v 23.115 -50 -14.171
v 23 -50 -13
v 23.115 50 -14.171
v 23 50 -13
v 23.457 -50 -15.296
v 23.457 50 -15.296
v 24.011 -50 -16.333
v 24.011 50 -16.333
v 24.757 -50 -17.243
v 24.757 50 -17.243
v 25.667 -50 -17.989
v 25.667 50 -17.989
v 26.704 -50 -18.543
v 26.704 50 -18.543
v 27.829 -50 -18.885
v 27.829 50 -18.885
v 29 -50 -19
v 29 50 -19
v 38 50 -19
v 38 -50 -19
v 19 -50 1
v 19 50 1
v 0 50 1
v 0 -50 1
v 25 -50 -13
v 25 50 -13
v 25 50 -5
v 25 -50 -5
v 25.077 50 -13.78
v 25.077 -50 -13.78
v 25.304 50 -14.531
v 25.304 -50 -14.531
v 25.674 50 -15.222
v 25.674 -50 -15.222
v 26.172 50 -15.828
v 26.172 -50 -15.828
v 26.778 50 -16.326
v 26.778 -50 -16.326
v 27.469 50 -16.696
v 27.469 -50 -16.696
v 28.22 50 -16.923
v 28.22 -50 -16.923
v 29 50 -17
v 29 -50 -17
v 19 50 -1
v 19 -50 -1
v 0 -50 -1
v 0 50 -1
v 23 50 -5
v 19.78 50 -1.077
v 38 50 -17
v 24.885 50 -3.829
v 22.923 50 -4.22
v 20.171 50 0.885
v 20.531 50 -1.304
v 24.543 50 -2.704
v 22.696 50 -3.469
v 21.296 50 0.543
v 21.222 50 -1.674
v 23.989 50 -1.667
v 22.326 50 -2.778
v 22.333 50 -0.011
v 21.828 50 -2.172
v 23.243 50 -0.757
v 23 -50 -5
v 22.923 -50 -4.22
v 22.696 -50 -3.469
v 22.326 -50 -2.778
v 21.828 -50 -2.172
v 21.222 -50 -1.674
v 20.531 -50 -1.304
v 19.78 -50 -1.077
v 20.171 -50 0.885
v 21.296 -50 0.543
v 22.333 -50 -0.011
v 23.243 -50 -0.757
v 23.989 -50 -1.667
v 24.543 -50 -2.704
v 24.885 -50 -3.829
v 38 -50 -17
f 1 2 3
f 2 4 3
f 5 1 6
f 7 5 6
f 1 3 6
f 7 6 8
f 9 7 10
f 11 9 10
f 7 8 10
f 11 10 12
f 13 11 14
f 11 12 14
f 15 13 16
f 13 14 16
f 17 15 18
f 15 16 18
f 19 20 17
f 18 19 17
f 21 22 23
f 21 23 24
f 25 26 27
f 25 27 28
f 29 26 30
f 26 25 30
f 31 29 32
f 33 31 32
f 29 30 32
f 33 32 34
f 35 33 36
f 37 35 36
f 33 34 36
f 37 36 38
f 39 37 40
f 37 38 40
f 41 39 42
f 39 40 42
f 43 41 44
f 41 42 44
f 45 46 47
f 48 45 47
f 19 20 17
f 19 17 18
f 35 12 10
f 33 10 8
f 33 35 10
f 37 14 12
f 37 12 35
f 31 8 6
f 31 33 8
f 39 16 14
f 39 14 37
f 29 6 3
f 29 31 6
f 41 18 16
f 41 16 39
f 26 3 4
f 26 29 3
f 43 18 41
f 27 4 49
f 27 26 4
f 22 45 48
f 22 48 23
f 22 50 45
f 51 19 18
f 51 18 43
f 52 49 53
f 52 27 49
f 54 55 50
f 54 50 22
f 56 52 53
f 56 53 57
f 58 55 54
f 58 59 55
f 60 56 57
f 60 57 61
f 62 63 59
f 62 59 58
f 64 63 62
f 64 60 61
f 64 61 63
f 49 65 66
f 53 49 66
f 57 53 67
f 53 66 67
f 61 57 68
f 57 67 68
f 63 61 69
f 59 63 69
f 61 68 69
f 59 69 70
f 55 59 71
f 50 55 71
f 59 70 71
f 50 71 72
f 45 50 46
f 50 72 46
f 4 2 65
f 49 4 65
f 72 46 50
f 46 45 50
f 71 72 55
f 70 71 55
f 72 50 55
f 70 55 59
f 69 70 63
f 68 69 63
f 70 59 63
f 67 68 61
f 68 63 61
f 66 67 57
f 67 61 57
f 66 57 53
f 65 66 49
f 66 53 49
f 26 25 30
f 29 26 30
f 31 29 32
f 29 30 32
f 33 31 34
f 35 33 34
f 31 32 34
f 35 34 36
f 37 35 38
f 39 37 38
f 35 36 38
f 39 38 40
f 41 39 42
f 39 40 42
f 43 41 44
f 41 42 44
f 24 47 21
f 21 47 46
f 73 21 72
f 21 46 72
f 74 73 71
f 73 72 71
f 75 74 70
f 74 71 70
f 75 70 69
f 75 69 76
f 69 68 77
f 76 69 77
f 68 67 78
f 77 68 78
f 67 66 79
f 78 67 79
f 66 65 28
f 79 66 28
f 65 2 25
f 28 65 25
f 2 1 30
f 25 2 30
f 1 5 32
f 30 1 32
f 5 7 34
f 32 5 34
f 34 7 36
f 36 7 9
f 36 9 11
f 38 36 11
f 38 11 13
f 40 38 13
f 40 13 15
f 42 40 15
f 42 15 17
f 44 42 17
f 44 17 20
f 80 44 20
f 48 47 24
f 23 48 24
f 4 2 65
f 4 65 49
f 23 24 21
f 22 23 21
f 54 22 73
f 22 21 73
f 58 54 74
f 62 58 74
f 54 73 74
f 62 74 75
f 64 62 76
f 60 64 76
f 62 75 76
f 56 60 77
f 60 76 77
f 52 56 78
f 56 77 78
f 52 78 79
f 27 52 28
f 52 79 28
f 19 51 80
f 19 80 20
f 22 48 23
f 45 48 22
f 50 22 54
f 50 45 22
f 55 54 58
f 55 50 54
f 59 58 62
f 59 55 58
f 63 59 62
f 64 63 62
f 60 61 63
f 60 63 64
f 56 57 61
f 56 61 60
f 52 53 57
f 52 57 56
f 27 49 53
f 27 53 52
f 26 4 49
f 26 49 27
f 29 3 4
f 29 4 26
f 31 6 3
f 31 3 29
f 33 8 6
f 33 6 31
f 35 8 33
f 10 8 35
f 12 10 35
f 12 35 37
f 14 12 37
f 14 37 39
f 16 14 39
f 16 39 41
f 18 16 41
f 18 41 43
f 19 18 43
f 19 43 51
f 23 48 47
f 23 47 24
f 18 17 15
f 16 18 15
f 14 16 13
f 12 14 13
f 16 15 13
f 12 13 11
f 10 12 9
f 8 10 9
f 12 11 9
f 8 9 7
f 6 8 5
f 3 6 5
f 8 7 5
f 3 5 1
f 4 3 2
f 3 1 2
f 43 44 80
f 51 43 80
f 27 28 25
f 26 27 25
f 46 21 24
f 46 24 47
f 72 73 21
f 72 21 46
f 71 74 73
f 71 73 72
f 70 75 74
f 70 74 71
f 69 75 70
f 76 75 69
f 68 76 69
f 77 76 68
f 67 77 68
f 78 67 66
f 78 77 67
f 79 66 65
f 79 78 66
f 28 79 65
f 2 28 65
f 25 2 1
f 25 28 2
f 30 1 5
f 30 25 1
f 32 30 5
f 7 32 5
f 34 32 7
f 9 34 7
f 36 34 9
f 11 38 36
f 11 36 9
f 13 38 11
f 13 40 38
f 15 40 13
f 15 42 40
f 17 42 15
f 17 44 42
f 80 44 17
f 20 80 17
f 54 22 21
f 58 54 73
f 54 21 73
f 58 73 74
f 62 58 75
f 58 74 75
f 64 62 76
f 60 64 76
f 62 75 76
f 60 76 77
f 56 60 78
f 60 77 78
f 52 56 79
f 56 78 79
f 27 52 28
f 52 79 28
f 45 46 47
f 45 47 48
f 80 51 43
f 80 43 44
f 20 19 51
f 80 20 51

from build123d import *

# Parameters (mm, degrees)
SKETCH1_W            = 100
SKETCH1_H            = 2
CONVERT_SOLID3_START = -50
CONVERT_SOLID3_DEPTH = 100


# Read off the part's stored shape, not the designer's step: Convert-Solid3
with BuildPart() as part:
    # Sweep1: sweep along a path in Sketch2
    with BuildLine(Plane(origin=(0, 0, 0), x_dir=(1, 0, 0), z_dir=(0, 1, 0))) as sweep1_path:
        Line((0, 0), (19, 0))
        ThreePointArc((19, 0), (22.535533906, 1.464466094), (24, 5))
        Line((24, 5), (24, 13))
        ThreePointArc((24, 13), (25.464466094, 16.535533906), (29, 18))
        Line((29, 18), (38, 18))
    # Sketch1 → Sweep1 (sweep)
    with BuildSketch(Plane.YZ):
        Rectangle(SKETCH1_W, SKETCH1_H)
    sweep(path=sweep1_path.line)


with BuildPart() as body_2:
    # Convert-Solid3 outline → Convert-Solid3 (new body)
    with BuildSketch(Plane(origin=(0, 0, 0), x_dir=(1, 0, 0), z_dir=(0, 1, 0)).offset(CONVERT_SOLID3_START)):
        with BuildLine():
            Line((0, 1), (0, -1))
            Line((0, -1), (19, -1))
            ThreePointArc((19, -1), (23.242640687, 0.757359313), (25, 5))
            Line((25, 5), (25, 13))
            ThreePointArc((25, 13), (26.171572875, 15.828427125), (29, 17))
            Line((29, 17), (38, 17))
            Line((38, 17), (38, 19))
            Line((38, 19), (29, 19))
            ThreePointArc((29, 19), (24.757359313, 17.242640687), (23, 13))
            Line((23, 13), (23, 5))
            ThreePointArc((23, 5), (21.828427125, 2.171572875), (19, 1))
            Line((19, 1), (0, 1))
        make_face()
    extrude(amount=CONVERT_SOLID3_DEPTH)


solid = Compound([part.part, body_2.part])
